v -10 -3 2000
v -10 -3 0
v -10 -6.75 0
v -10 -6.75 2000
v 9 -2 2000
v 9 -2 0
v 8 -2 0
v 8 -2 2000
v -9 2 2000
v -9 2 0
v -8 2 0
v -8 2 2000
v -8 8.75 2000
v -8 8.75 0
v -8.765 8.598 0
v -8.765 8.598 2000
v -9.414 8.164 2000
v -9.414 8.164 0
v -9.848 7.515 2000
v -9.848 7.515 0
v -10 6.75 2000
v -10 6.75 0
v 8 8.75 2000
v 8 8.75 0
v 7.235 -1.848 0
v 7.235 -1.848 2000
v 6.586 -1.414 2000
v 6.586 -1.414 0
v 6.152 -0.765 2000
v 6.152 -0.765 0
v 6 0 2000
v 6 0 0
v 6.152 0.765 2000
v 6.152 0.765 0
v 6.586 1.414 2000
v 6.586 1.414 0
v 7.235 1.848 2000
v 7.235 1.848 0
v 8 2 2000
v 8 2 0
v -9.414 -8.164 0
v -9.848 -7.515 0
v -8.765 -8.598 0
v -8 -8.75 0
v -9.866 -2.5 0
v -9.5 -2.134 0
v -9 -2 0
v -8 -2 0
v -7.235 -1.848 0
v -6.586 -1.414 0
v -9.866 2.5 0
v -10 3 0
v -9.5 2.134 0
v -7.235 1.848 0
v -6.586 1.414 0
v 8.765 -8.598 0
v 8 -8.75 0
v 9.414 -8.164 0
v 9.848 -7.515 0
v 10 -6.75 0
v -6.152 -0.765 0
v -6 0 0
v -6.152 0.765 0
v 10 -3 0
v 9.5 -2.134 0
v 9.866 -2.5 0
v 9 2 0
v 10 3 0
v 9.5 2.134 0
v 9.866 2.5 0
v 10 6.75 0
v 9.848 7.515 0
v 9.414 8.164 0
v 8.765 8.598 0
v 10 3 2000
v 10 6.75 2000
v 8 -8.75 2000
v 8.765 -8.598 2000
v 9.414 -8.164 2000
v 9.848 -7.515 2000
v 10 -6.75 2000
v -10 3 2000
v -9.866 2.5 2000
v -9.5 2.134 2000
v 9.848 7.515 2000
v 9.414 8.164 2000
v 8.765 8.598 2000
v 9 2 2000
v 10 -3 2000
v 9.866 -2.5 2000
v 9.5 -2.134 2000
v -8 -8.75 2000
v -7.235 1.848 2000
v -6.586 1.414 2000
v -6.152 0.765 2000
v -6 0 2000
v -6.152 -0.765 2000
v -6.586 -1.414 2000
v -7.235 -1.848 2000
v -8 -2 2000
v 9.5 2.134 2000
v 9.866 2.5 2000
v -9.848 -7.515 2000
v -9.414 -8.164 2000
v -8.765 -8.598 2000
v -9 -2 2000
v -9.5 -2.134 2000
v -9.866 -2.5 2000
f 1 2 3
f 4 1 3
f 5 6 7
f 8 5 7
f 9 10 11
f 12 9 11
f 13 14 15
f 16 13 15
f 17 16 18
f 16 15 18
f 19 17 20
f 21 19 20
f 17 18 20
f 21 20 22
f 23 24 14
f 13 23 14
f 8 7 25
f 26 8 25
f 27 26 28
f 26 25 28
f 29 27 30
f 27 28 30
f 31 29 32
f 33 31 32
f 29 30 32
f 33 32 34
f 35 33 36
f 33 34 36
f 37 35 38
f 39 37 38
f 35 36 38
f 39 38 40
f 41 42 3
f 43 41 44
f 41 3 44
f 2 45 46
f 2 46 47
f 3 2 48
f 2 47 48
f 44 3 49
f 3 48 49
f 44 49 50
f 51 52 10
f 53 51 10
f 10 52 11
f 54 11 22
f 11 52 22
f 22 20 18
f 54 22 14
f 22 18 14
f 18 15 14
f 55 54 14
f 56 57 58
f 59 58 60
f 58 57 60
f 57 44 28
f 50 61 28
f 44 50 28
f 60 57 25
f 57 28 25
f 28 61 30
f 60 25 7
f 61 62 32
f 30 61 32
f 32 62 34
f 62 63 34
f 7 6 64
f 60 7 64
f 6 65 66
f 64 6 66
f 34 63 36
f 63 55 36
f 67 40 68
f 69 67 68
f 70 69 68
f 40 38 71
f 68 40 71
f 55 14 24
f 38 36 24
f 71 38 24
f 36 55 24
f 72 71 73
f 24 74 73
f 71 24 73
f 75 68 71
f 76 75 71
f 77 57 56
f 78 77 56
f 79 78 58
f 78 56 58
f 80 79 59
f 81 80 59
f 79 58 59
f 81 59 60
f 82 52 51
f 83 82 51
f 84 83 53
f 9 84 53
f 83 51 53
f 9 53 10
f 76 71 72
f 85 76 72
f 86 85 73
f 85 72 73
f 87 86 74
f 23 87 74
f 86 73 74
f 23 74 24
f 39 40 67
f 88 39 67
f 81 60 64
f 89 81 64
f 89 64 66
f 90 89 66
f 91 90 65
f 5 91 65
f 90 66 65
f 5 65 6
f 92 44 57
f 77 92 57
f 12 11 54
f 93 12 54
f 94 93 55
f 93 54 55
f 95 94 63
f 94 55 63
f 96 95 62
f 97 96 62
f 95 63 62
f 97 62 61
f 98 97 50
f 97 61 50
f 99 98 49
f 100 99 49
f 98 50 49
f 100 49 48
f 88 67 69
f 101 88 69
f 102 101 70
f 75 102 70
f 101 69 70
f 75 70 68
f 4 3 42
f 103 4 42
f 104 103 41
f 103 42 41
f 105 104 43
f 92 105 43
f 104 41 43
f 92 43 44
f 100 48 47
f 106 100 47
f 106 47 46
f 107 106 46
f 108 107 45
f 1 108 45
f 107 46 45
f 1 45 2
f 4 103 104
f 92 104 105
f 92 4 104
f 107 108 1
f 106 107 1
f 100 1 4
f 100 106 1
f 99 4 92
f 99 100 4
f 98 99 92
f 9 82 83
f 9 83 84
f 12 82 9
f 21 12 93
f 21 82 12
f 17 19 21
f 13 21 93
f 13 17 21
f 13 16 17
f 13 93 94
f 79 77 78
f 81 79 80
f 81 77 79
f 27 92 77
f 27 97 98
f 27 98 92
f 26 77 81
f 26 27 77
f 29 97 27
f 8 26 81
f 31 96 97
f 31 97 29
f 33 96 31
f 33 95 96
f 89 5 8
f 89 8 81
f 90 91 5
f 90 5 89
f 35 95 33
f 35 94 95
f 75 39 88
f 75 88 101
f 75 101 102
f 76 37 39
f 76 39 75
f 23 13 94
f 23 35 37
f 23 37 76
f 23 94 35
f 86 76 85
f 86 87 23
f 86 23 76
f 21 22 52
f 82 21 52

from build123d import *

# Parameters (mm, degrees)
BOSS_EXTRUDE1_DEPTH = 2000


with BuildPart() as part:
    # Sketch1 → Boss-Extrude1 (new body)
    with BuildSketch(Plane.XY):
        with BuildLine():
            Line((-8, -8.75), (8, -8.75))
            ThreePointArc((8, -8.75), (9.414213562, -8.164213562), (10, -6.75))
            Line((10, -6.75), (10, -3))
            ThreePointArc((10, -3), (9.707106781, -2.292893219), (9, -2))
            Line((9, -2), (8, -2))
            ThreePointArc((8, -2), (6, 0), (8, 2))
            Line((8, 2), (9, 2))
            ThreePointArc((9, 2), (9.707106781, 2.292893219), (10, 3))
            Line((10, 3), (10, 6.75))
            ThreePointArc((10, 6.75), (9.414213562, 8.164213562), (8, 8.75))
            Line((8, 8.75), (-8, 8.75))
            ThreePointArc((-8, 8.75), (-9.414213562, 8.164213562), (-10, 6.75))
            Line((-10, 6.75), (-10, 3))
            ThreePointArc((-10, 3), (-9.707106781, 2.292893219), (-9, 2))
            Line((-9, 2), (-8, 2))
            ThreePointArc((-8, 2), (-6, 0), (-8, -2))
            Line((-8, -2), (-9, -2))
            ThreePointArc((-9, -2), (-9.707106781, -2.292893219), (-10, -3))
            Line((-10, -3), (-10, -6.75))
            ThreePointArc((-10, -6.75), (-9.414213562, -8.164213562), (-8, -8.75))
        make_face()
    extrude(amount=BOSS_EXTRUDE1_DEPTH)


solid = part.part
